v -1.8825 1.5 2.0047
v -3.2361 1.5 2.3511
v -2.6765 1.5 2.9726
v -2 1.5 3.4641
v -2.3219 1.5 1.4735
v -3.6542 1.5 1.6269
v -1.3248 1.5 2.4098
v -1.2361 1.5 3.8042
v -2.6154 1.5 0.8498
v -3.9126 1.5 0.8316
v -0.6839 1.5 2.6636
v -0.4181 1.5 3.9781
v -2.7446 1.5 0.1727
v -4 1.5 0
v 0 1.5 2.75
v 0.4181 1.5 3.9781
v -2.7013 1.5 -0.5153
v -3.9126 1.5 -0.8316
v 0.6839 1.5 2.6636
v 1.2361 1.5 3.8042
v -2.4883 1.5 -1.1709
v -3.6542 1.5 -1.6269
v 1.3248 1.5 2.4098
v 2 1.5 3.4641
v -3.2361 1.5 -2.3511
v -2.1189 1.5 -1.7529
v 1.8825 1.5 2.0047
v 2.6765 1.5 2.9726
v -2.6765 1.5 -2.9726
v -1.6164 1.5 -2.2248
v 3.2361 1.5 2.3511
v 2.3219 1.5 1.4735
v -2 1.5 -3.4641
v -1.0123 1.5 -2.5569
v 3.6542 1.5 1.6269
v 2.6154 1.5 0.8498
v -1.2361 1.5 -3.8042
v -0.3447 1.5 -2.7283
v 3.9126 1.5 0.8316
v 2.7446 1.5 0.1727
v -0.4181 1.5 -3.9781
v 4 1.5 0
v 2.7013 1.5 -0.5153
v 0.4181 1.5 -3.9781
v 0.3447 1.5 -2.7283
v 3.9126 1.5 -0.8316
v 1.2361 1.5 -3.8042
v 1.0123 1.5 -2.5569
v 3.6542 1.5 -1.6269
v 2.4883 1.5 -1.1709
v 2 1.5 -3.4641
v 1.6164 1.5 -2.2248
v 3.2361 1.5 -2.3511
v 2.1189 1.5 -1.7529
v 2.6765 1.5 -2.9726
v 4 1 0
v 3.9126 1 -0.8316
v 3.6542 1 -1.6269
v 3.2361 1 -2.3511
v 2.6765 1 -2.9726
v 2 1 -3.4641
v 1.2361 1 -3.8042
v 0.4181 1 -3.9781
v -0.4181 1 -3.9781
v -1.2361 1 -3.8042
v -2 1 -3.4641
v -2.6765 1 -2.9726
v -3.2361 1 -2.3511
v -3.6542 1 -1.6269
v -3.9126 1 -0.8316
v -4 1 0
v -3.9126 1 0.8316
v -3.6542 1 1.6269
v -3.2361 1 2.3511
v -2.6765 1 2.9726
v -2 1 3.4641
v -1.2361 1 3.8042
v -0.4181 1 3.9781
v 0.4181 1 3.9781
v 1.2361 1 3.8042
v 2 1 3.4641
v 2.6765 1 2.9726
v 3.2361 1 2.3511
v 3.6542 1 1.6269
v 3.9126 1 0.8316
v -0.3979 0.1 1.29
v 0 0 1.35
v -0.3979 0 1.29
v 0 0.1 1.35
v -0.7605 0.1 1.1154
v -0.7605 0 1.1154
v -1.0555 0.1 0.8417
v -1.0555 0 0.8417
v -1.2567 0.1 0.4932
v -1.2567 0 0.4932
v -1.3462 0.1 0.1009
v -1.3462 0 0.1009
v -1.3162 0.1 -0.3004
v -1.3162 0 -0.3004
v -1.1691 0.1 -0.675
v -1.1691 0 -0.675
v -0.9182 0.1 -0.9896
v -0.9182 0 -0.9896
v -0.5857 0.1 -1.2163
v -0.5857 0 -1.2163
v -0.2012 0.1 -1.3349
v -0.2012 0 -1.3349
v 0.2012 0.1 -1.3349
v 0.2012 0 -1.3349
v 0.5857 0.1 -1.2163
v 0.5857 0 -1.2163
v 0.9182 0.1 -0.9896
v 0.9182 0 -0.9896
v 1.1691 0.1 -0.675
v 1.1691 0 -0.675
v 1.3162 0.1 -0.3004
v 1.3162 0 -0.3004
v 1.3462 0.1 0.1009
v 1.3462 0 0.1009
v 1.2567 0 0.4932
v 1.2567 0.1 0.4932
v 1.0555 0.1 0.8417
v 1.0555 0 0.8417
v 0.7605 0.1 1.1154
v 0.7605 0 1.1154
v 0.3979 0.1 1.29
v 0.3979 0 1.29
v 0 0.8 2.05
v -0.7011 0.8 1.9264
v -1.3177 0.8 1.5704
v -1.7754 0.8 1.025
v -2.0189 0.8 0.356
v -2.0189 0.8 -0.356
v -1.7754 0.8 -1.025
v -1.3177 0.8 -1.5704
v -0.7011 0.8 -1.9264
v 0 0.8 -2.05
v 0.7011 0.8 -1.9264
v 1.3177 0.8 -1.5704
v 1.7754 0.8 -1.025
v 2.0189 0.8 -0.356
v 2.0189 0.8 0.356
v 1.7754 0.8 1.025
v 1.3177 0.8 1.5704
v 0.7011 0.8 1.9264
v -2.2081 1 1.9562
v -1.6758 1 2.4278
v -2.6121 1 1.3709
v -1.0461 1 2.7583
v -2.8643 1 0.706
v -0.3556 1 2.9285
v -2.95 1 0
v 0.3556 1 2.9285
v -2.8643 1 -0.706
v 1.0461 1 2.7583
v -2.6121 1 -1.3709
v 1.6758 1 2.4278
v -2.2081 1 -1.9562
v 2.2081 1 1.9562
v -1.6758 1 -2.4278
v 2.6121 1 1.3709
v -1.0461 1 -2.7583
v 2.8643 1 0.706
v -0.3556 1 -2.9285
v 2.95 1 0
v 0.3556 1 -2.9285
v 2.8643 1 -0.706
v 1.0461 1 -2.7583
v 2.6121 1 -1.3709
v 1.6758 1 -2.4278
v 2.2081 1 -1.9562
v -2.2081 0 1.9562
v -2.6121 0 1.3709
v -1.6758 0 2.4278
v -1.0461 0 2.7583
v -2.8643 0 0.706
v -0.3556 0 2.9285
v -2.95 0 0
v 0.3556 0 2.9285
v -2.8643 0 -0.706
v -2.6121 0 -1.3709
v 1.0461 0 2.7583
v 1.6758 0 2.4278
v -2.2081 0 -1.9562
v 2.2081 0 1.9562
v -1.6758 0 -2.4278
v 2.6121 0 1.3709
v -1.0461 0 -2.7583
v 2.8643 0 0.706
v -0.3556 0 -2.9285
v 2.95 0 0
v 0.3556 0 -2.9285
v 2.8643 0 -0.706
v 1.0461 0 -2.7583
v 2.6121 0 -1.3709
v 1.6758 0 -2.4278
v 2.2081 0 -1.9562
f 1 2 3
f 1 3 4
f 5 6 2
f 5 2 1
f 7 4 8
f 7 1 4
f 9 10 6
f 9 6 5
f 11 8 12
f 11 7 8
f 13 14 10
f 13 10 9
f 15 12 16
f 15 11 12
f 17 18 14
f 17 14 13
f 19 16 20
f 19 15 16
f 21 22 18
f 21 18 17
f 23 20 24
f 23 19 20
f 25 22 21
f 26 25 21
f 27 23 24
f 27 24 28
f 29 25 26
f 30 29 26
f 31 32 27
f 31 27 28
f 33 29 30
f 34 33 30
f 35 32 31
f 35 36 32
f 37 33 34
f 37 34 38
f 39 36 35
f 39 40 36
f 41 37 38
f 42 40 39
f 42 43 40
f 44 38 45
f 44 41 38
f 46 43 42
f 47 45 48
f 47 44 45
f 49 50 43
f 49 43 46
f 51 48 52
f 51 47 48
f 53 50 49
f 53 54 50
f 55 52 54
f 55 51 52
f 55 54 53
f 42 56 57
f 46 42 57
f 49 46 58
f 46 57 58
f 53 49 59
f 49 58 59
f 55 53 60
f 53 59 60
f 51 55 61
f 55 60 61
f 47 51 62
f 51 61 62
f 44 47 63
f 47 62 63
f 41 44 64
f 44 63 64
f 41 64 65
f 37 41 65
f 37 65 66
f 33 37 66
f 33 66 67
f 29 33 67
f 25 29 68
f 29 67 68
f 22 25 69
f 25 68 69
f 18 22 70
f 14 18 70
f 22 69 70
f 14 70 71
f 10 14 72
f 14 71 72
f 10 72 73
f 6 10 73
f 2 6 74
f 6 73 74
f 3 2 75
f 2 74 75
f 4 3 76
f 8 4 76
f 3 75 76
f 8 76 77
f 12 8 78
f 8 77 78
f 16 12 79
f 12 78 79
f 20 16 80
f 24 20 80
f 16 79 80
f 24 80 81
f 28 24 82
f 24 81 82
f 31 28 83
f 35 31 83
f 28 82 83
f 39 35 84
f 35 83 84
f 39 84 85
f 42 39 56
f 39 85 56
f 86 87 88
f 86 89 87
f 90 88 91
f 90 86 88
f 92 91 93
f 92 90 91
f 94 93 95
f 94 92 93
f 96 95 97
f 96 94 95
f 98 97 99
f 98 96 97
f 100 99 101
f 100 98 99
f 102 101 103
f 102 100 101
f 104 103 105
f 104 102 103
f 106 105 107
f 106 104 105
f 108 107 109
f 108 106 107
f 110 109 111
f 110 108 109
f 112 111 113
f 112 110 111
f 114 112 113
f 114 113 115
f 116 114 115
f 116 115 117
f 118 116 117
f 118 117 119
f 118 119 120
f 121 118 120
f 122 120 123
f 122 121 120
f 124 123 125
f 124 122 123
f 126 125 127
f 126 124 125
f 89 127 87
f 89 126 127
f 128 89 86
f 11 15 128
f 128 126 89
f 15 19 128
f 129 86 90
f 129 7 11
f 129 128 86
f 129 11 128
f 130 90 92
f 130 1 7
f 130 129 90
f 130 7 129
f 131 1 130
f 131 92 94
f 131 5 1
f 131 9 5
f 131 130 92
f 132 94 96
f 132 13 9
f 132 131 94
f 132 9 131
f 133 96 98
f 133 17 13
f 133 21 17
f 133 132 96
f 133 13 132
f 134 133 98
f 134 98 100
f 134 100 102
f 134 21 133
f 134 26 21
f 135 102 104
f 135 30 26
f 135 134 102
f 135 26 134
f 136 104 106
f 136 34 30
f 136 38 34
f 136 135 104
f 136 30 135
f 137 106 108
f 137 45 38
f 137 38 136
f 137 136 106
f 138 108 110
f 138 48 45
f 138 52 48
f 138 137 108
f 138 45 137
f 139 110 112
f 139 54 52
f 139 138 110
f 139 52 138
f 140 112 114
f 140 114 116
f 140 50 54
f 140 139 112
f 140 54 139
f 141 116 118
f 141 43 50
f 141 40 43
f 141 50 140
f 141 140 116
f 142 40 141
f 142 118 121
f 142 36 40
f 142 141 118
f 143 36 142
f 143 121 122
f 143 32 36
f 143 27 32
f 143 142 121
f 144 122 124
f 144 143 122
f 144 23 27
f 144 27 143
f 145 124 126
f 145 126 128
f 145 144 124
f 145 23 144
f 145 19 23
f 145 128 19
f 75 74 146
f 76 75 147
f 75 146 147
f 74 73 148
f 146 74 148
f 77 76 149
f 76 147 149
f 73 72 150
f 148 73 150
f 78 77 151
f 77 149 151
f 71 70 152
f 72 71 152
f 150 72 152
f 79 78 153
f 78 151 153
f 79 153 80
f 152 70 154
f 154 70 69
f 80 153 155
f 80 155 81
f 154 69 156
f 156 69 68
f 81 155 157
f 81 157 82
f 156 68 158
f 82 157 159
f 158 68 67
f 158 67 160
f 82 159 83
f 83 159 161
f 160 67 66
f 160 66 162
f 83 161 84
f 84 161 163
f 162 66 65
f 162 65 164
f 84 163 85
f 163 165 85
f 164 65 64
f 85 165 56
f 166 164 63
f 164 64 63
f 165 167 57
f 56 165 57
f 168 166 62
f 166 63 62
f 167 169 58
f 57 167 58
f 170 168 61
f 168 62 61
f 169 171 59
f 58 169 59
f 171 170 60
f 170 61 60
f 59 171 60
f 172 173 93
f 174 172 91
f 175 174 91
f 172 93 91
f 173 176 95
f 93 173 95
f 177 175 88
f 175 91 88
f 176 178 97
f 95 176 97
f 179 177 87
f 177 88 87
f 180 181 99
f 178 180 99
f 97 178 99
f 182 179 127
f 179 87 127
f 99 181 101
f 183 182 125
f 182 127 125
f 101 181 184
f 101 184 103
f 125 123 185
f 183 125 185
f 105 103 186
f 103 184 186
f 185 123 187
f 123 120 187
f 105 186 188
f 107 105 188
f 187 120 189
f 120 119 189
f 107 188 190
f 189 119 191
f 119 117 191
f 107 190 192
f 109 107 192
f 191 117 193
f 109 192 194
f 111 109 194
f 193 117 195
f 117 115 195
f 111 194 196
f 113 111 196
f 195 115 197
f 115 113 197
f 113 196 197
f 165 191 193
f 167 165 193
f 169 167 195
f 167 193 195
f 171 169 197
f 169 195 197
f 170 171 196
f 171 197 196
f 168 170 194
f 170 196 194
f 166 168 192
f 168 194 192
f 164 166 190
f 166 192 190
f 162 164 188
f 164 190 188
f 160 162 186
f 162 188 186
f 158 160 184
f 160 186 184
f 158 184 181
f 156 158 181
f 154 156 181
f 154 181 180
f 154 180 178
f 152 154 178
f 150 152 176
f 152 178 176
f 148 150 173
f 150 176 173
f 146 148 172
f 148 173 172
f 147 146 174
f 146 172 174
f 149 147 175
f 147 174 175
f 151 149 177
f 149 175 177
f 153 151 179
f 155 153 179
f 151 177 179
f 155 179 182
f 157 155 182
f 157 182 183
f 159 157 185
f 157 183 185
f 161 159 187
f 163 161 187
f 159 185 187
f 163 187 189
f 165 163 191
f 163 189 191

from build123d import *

# Parameters (mm, degrees)
SKETCH1_R           = 2.95
BOSS_EXTRUDE1_DEPTH = 1
SKETCH2_R           = 4
BOSS_EXTRUDE2_DEPTH = 0.5


with BuildPart() as part:
    # Sketch1 → Boss-Extrude1 (new body)
    with BuildSketch(Plane(origin=(0, 0, 0), x_dir=(1, 0, 0), z_dir=(0, 1, 0))):
        Circle(SKETCH1_R)
    extrude(amount=BOSS_EXTRUDE1_DEPTH)

    # Sketch2 → Boss-Extrude2 (add)
    with BuildSketch(Plane(origin=(0, 1, 0), x_dir=(1, 0, 0), z_dir=(0, 1, 0))):
        Circle(SKETCH2_R)
    extrude(amount=BOSS_EXTRUDE2_DEPTH)

    # Sketch3 → CSK for M2.5 Flat Head Machine Screw1 (revolve, cut)
    with BuildSketch(Plane(origin=(0, 1.5, 0), x_dir=(0, 0, 1), z_dir=(1, 0, 0))):
        Polygon((0, 0), (0, 2.311161836), (1.35, 1.5), (1.35, 1.4), (2.75, 0), align=None)
    revolve(axis=Axis((0, 7.85, 0), (0, -1, 0)), mode=Mode.SUBTRACT)


solid = part.part
